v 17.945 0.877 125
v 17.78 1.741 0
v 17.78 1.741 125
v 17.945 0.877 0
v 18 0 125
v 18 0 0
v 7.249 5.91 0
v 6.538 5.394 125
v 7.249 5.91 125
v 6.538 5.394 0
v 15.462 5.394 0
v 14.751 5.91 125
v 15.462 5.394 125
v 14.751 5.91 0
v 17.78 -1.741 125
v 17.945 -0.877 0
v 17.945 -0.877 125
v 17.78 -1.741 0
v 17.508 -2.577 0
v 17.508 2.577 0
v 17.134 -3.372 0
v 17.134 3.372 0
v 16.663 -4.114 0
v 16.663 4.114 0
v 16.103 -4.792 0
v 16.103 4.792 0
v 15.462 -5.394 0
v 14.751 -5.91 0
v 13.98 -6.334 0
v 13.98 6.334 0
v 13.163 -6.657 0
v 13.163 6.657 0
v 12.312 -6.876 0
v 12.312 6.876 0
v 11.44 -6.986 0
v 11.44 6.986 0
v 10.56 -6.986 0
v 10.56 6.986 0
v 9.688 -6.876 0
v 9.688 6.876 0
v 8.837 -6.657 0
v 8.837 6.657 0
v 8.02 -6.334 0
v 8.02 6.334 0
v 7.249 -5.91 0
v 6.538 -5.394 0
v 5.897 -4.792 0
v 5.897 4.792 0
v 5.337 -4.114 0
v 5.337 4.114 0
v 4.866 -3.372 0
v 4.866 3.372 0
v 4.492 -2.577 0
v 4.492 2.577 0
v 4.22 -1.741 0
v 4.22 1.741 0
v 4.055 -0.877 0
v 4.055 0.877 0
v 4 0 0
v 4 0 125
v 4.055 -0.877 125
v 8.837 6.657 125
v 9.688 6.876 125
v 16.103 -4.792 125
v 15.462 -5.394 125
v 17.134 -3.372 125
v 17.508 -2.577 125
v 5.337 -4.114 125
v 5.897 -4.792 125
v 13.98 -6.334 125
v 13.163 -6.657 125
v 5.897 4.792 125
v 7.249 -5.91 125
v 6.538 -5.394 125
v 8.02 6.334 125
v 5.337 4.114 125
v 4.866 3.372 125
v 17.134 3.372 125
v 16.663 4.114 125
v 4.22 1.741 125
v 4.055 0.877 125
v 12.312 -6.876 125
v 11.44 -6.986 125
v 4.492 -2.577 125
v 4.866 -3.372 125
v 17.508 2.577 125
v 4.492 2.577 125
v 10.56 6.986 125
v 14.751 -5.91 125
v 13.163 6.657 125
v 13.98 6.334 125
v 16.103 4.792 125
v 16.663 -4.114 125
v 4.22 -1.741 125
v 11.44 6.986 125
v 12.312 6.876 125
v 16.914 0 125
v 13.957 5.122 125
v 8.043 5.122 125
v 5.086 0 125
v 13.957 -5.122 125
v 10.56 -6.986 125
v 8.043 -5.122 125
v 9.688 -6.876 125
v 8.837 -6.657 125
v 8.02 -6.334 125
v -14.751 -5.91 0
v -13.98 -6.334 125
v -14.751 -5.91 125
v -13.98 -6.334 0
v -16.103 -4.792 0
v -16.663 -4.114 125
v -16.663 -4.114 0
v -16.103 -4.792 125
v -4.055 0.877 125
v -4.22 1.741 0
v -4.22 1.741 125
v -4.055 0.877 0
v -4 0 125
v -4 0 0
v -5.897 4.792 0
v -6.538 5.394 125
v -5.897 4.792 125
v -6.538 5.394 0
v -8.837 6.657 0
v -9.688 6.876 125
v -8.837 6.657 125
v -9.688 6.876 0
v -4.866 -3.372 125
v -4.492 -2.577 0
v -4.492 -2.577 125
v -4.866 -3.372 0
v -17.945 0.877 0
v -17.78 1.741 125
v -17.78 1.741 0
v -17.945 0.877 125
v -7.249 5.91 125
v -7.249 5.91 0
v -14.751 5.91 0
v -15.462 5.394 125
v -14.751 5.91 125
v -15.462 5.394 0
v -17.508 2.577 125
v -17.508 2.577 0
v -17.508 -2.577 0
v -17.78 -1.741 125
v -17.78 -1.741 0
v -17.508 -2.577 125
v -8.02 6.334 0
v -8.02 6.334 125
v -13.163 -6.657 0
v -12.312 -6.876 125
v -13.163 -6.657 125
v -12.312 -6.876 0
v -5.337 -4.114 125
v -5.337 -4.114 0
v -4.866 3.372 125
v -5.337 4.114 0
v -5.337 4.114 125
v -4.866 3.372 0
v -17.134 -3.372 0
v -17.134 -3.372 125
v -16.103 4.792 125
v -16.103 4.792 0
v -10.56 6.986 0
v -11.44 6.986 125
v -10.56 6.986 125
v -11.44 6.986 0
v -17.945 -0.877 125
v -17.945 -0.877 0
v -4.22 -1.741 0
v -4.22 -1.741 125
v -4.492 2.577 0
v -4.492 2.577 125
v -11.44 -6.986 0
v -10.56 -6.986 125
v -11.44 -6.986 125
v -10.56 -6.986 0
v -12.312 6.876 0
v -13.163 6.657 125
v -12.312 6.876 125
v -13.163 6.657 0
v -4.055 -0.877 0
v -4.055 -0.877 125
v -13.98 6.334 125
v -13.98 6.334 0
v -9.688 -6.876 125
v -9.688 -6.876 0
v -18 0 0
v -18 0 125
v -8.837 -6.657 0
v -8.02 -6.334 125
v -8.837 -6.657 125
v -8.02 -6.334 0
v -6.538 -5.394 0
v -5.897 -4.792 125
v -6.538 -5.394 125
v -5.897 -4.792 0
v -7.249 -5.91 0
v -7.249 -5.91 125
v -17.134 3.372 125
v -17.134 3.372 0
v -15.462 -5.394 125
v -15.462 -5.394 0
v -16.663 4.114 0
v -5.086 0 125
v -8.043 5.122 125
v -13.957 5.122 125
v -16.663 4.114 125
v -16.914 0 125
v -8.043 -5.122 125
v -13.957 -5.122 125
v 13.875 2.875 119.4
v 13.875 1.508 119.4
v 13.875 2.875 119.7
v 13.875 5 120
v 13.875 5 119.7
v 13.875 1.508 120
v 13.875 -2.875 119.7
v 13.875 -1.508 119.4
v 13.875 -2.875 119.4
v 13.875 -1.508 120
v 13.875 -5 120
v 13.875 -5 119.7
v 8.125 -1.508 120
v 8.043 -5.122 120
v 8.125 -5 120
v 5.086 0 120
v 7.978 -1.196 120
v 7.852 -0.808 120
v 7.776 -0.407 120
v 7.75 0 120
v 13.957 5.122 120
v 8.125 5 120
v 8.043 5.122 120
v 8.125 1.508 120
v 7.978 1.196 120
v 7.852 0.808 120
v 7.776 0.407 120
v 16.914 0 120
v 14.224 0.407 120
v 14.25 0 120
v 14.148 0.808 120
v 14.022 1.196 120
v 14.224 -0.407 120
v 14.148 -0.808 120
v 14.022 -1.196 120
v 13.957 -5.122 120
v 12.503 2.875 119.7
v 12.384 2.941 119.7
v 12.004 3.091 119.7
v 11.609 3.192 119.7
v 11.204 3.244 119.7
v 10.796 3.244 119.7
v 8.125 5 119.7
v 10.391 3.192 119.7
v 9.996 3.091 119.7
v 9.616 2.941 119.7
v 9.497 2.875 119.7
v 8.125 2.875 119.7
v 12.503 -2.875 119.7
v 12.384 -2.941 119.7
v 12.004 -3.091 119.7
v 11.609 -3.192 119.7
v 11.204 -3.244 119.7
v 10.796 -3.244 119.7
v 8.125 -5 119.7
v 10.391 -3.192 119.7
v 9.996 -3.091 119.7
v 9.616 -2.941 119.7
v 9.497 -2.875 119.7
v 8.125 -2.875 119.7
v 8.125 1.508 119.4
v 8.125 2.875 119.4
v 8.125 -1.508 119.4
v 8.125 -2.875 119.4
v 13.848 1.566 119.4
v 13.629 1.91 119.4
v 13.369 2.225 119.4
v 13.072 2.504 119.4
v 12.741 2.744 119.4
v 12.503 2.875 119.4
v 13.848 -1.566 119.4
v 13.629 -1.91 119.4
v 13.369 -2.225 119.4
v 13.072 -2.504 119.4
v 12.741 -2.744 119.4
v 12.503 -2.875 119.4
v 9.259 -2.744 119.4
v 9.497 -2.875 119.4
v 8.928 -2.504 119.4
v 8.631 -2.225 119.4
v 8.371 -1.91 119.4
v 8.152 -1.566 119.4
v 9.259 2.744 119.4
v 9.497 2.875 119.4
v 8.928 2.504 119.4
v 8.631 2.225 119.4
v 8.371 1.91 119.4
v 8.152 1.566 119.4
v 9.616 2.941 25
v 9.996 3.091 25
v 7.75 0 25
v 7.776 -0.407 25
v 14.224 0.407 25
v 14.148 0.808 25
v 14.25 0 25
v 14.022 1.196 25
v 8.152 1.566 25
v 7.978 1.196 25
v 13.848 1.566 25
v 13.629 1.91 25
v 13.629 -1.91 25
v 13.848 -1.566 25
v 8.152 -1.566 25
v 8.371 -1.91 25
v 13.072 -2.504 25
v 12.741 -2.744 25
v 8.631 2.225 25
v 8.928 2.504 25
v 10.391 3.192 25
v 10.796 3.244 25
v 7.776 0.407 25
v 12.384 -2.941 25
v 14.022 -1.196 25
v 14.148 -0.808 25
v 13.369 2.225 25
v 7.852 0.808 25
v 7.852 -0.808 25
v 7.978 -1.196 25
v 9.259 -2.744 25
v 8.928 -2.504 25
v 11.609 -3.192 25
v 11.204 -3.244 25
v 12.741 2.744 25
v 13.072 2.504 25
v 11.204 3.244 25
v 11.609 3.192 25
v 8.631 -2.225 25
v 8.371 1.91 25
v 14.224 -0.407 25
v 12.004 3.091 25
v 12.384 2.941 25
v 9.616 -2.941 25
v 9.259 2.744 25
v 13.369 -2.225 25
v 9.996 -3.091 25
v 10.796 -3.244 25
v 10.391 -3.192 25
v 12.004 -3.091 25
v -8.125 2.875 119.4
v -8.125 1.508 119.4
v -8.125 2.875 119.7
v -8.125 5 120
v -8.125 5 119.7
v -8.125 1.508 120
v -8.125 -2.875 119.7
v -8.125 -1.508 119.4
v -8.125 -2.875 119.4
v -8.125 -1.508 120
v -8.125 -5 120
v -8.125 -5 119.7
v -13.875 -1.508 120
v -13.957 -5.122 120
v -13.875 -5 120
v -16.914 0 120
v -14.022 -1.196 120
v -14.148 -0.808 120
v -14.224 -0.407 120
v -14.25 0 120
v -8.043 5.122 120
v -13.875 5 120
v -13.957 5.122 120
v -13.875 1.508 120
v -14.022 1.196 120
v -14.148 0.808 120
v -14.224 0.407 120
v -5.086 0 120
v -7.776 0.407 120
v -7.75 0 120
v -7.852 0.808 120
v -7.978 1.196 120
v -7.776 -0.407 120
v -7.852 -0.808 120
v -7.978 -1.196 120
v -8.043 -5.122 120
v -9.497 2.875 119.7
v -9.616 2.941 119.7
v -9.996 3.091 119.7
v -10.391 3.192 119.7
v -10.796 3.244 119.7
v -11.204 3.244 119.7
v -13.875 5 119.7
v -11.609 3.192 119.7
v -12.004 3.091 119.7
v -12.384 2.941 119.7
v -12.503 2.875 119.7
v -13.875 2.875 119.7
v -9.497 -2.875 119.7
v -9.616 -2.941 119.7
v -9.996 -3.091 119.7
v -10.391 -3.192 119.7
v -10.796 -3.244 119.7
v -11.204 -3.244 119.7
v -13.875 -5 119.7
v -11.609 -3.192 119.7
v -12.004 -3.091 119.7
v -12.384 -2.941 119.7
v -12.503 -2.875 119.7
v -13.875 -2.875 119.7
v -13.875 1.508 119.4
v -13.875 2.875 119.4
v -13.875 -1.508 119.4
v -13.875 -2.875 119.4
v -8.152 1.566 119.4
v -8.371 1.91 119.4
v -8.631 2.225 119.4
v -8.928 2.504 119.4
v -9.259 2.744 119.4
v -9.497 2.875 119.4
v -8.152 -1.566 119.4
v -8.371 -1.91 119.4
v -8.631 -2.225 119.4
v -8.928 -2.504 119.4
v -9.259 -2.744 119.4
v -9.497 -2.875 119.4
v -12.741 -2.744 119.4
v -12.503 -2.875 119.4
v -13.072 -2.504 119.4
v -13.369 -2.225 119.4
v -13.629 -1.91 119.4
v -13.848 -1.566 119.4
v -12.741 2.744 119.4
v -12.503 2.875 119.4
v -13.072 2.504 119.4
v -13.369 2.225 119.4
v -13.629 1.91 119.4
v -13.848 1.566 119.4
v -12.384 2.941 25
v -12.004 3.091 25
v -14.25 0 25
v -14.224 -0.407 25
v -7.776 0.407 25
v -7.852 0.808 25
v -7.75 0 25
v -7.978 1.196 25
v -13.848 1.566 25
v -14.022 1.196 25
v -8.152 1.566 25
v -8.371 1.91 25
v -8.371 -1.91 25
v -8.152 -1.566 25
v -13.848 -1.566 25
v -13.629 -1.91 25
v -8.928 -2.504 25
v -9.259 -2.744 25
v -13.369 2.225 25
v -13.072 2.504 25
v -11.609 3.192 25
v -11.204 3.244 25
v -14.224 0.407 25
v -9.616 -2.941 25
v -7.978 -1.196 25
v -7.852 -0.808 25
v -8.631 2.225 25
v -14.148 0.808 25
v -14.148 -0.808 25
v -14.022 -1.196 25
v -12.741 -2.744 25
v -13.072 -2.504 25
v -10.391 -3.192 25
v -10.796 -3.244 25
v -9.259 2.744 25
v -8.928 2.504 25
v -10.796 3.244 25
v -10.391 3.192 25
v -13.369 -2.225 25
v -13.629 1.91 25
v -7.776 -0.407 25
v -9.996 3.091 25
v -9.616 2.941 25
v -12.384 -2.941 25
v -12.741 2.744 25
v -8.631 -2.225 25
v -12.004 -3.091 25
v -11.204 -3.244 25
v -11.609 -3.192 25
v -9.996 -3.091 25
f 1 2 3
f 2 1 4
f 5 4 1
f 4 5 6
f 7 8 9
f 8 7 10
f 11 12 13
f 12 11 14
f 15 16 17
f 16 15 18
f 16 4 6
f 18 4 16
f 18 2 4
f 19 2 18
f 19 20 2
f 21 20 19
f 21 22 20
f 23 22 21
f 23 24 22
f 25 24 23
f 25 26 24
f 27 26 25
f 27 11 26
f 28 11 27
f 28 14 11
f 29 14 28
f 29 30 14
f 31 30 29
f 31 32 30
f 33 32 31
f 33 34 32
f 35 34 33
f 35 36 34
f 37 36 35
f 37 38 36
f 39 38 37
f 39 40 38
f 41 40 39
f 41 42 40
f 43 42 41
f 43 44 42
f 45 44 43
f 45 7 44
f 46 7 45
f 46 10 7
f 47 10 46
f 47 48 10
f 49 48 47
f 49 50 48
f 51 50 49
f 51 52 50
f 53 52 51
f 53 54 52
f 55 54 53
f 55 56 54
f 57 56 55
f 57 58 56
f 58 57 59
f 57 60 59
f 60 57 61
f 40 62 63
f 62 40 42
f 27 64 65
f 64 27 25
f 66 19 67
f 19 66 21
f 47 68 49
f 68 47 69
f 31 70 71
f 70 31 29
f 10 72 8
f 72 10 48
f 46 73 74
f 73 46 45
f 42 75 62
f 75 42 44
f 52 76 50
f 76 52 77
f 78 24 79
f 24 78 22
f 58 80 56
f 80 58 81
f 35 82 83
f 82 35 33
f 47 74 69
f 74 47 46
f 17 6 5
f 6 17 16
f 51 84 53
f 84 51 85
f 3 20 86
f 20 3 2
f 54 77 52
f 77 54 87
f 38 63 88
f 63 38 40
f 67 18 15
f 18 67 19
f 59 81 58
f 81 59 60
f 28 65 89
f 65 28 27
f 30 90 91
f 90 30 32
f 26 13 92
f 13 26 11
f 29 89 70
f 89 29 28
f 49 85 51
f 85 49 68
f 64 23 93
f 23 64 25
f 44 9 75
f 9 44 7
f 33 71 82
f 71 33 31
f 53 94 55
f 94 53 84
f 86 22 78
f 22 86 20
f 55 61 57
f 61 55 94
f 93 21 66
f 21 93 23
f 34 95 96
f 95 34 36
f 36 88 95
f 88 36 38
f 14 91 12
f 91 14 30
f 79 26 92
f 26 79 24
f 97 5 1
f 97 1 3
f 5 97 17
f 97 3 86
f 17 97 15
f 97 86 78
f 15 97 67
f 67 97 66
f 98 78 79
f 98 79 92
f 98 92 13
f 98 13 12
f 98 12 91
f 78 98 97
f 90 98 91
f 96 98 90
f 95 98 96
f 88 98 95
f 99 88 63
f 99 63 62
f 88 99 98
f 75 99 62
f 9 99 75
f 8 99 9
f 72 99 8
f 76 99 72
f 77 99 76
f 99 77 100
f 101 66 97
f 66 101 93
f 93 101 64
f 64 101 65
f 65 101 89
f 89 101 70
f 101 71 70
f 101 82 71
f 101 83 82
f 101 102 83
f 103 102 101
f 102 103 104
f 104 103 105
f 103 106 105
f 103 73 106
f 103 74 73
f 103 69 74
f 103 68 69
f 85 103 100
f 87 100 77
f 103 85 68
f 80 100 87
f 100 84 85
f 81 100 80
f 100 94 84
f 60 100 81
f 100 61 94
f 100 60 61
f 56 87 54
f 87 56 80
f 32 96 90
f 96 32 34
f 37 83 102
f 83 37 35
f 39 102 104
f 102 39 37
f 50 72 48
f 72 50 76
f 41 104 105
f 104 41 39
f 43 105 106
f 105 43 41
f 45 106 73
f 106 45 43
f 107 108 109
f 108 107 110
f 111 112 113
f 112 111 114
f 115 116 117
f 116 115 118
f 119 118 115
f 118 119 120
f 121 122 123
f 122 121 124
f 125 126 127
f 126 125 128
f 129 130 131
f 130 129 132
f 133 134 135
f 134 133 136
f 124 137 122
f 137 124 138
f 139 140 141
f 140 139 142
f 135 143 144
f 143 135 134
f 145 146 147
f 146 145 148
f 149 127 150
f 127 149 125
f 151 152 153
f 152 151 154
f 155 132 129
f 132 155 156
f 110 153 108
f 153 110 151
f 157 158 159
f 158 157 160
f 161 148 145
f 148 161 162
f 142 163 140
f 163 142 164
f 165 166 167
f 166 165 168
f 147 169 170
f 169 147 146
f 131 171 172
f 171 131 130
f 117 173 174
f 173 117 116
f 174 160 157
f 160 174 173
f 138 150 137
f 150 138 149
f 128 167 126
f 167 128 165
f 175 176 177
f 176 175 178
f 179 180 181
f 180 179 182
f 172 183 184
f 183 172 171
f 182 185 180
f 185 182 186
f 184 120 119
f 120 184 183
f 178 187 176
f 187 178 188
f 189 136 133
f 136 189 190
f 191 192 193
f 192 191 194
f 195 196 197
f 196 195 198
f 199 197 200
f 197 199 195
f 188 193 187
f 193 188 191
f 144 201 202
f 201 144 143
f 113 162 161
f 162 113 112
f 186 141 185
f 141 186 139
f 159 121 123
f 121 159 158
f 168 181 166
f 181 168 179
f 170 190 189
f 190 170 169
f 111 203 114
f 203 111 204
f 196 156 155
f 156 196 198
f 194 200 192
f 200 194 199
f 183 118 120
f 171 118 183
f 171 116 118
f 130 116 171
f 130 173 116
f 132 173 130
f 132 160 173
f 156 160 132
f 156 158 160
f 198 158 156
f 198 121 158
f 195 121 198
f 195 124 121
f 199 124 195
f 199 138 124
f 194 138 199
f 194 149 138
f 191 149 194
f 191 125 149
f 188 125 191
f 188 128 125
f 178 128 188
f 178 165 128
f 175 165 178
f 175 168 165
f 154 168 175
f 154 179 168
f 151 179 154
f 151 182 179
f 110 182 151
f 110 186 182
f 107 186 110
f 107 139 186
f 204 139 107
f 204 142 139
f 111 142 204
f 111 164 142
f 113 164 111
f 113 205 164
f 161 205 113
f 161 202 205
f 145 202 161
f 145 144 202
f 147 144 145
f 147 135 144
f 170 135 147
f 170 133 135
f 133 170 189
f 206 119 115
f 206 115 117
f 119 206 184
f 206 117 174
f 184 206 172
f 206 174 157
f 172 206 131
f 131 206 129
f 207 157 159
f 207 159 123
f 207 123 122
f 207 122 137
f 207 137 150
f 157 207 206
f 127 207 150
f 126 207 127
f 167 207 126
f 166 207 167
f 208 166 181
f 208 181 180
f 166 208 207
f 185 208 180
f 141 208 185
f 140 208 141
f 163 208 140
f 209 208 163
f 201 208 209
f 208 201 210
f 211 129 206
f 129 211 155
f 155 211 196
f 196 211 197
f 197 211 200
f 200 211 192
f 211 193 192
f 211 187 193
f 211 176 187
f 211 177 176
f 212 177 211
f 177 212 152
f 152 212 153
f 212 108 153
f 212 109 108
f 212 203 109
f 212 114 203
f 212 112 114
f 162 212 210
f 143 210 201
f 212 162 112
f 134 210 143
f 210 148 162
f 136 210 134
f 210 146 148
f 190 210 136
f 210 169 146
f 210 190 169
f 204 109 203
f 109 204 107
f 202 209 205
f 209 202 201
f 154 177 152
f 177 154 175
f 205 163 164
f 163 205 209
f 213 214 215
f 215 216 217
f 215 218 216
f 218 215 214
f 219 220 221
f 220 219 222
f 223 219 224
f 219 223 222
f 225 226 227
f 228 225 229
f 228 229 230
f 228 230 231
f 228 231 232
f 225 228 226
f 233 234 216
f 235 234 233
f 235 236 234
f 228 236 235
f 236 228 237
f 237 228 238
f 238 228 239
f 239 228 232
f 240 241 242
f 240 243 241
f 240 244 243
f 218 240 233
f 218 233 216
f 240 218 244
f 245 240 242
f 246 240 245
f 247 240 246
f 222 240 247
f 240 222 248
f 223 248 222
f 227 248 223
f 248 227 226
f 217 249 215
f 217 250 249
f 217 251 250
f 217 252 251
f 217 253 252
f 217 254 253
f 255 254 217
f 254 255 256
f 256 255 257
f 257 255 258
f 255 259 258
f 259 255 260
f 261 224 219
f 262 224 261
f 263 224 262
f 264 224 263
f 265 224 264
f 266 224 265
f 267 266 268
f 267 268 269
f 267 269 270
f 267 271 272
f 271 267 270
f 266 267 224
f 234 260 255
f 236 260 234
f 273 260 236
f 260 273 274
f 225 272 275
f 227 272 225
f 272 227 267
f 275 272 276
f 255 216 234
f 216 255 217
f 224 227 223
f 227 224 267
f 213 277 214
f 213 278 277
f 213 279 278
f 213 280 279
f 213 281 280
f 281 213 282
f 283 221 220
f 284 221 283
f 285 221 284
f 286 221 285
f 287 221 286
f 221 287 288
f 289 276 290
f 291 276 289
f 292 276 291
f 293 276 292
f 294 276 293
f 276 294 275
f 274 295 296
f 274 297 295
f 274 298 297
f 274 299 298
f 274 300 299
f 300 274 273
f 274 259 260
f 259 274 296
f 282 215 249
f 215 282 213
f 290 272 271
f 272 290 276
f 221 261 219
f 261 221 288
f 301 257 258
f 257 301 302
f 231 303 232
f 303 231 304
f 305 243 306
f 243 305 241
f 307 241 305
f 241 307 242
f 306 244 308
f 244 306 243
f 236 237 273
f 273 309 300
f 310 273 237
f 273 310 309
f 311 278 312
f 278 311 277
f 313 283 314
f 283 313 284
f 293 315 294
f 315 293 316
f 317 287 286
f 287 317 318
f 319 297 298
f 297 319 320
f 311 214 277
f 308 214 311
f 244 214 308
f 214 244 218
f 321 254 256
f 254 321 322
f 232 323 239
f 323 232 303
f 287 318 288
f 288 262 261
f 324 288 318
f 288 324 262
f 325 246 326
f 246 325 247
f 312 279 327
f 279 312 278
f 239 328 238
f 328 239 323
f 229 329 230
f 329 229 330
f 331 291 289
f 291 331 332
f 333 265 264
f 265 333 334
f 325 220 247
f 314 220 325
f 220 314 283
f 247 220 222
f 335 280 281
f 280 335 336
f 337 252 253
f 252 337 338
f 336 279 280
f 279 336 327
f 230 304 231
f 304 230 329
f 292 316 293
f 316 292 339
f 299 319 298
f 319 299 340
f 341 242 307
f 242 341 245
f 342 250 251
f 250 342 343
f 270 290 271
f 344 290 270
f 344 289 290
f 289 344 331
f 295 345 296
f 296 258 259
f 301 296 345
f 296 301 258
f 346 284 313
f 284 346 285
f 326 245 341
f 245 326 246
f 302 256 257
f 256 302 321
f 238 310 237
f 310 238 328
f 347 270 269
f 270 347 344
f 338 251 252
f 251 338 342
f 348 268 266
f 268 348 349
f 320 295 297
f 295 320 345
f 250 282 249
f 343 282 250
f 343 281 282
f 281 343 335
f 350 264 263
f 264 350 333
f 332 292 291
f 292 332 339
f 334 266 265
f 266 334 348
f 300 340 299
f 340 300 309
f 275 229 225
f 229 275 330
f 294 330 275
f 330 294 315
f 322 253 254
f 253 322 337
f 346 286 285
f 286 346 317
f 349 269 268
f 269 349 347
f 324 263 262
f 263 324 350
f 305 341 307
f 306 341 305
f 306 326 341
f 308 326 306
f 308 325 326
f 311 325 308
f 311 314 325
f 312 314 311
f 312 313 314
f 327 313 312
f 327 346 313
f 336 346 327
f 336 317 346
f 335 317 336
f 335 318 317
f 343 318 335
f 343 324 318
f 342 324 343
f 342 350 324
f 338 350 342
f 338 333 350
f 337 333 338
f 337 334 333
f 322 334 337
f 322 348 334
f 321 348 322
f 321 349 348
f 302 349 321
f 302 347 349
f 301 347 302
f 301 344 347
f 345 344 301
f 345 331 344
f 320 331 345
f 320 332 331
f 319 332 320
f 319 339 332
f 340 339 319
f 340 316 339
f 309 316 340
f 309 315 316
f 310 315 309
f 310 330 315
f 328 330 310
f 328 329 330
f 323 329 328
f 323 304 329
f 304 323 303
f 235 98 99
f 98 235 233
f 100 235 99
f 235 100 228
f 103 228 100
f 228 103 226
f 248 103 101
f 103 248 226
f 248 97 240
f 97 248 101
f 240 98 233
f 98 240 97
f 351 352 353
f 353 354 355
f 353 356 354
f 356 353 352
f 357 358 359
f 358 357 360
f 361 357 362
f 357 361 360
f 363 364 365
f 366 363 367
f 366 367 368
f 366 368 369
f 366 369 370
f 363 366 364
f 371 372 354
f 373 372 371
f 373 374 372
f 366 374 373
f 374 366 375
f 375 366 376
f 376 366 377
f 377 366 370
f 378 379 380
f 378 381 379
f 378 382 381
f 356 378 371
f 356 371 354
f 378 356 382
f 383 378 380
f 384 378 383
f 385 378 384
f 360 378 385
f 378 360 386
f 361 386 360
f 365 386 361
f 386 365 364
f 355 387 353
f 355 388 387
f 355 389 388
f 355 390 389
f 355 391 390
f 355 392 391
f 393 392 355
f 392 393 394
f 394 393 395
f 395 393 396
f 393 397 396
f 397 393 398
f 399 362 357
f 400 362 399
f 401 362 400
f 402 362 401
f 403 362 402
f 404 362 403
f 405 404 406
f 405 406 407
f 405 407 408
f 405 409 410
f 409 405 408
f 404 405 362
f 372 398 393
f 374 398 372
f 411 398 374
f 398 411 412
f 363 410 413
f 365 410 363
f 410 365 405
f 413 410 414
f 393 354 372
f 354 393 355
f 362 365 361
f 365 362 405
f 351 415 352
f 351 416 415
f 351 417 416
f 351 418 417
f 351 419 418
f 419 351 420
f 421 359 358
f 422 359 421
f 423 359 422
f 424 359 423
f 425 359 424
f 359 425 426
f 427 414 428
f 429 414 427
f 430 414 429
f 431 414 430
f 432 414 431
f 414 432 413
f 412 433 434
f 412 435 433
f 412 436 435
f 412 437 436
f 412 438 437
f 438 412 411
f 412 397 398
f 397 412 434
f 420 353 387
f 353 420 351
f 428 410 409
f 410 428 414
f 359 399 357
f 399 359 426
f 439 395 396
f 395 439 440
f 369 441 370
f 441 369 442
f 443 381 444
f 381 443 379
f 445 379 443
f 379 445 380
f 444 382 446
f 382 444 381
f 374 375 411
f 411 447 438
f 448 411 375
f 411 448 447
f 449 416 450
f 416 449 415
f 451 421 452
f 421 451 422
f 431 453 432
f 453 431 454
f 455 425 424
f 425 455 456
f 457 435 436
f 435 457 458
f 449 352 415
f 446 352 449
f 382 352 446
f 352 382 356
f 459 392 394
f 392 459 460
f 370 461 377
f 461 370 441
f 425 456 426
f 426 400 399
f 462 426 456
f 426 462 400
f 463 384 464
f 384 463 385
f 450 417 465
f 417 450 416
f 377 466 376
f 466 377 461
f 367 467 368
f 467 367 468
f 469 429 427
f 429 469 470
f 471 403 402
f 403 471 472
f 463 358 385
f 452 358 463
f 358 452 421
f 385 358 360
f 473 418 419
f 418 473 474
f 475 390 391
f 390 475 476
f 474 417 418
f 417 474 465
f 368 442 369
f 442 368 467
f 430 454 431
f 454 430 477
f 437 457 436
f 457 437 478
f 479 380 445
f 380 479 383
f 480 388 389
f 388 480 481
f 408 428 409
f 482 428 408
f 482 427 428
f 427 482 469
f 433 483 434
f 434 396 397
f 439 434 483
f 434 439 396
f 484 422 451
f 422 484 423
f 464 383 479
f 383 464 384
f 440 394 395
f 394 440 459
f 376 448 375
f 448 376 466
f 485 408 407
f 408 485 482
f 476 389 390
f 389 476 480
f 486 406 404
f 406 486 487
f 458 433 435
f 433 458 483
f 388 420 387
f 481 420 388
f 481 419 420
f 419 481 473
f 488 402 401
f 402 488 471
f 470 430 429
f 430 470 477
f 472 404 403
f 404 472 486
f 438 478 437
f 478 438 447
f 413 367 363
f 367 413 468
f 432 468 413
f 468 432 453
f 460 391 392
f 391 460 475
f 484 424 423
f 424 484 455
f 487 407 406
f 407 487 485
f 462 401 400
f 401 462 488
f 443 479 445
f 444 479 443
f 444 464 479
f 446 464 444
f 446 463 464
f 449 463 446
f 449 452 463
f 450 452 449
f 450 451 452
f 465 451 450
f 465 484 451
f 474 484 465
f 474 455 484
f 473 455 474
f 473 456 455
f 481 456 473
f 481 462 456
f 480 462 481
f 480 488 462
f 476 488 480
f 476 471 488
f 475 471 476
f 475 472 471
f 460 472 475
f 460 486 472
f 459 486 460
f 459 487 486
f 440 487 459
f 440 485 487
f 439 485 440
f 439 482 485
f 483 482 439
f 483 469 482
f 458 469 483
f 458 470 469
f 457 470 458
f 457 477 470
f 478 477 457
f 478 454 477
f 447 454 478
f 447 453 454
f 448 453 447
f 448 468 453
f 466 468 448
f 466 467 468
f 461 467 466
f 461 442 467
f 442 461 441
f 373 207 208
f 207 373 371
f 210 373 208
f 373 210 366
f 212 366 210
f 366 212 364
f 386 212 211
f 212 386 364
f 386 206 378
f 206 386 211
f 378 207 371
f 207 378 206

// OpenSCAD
$fn = 50;


difference() {
	union() {
		translate(v = [11.0000000000, 0, 0.0000000000]) {
			cylinder(h = 125, r = 7.0000000000);
		}
		translate(v = [-11.0000000000, 0, 0.0000000000]) {
			cylinder(h = 125, r = 7.0000000000);
		}
	}
	union() {
		translate(v = [11.0000000000, 0, 125]) {
			rotate(a = [0, 0, 0]) {
				difference() {
					union() {
						#translate(v = [-2.8750000000, -5.0000000000, -5.3000000000]) {
							cube(size = [5.7500000000, 10, 0.3000000000]);
						}
						#translate(v = [-2.8750000000, -2.8750000000, -5.6000000000]) {
							cube(size = [5.7500000000, 5.7500000000, 0.3000000000]);
						}
						#translate(v = [-2.8750000000, -5.0000000000, 0]) {
							cube(size = [5.7500000000, 10, 0.3000000000]);
						}
						#translate(v = [-2.8750000000, -2.8750000000, 0.3000000000]) {
							cube(size = [5.7500000000, 5.7500000000, 0.3000000000]);
						}
						#translate(v = [0, 0, -100.0000000000]) {
							cylinder(h = 200, r = 3.2500000000);
						}
						translate(v = [0, 0, -5]) {
							#linear_extrude(height = 5) {
								polygon(points = [[5.9142500000, 0.0000000000], [2.9571250000, 5.1218907443], [-2.9571250000, 5.1218907443], [-5.9142500000, 0.0000000000], [-2.9571250000, -5.1218907443], [2.9571250000, -5.1218907443]]);
							}
						}
						#translate(v = [-2.8750000000, -5.0000000000, -5.3000000000]) {
							cube(size = [5.7500000000, 10, 0.3000000000]);
						}
						#translate(v = [-2.8750000000, -2.8750000000, -5.6000000000]) {
							cube(size = [5.7500000000, 5.7500000000, 0.3000000000]);
						}
						#translate(v = [-2.8750000000, -5.0000000000, 0]) {
							cube(size = [5.7500000000, 10, 0.3000000000]);
						}
						#translate(v = [-2.8750000000, -2.8750000000, 0.3000000000]) {
							cube(size = [5.7500000000, 5.7500000000, 0.3000000000]);
						}
						#translate(v = [0, 0, -100.0000000000]) {
							cylinder(h = 200, r = 3.2500000000);
						}
						#translate(v = [-2.8750000000, -5.0000000000, -5.3000000000]) {
							cube(size = [5.7500000000, 10, 0.3000000000]);
						}
						#translate(v = [-2.8750000000, -2.8750000000, -5.6000000000]) {
							cube(size = [5.7500000000, 5.7500000000, 0.3000000000]);
						}
						#translate(v = [-2.8750000000, -5.0000000000, 0]) {
							cube(size = [5.7500000000, 10, 0.3000000000]);
						}
						#translate(v = [-2.8750000000, -2.8750000000, 0.3000000000]) {
							cube(size = [5.7500000000, 5.7500000000, 0.3000000000]);
						}
						#translate(v = [0, 0, -100.0000000000]) {
							cylinder(h = 200, r = 3.2500000000);
						}
					}
					union();
				}
			}
		}
		translate(v = [-11.0000000000, 0, 125]) {
			rotate(a = [0, 0, 0]) {
				difference() {
					union() {
						#translate(v = [-2.8750000000, -5.0000000000, -5.3000000000]) {
							cube(size = [5.7500000000, 10, 0.3000000000]);
						}
						#translate(v = [-2.8750000000, -2.8750000000, -5.6000000000]) {
							cube(size = [5.7500000000, 5.7500000000, 0.3000000000]);
						}
						#translate(v = [-2.8750000000, -5.0000000000, 0]) {
							cube(size = [5.7500000000, 10, 0.3000000000]);
						}
						#translate(v = [-2.8750000000, -2.8750000000, 0.3000000000]) {
							cube(size = [5.7500000000, 5.7500000000, 0.3000000000]);
						}
						#translate(v = [0, 0, -100.0000000000]) {
							cylinder(h = 200, r = 3.2500000000);
						}
						translate(v = [0, 0, -5]) {
							#linear_extrude(height = 5) {
								polygon(points = [[5.9142500000, 0.0000000000], [2.9571250000, 5.1218907443], [-2.9571250000, 5.1218907443], [-5.9142500000, 0.0000000000], [-2.9571250000, -5.1218907443], [2.9571250000, -5.1218907443]]);
							}
						}
						#translate(v = [-2.8750000000, -5.0000000000, -5.3000000000]) {
							cube(size = [5.7500000000, 10, 0.3000000000]);
						}
						#translate(v = [-2.8750000000, -2.8750000000, -5.6000000000]) {
							cube(size = [5.7500000000, 5.7500000000, 0.3000000000]);
						}
						#translate(v = [-2.8750000000, -5.0000000000, 0]) {
							cube(size = [5.7500000000, 10, 0.3000000000]);
						}
						#translate(v = [-2.8750000000, -2.8750000000, 0.3000000000]) {
							cube(size = [5.7500000000, 5.7500000000, 0.3000000000]);
						}
						#translate(v = [0, 0, -100.0000000000]) {
							cylinder(h = 200, r = 3.2500000000);
						}
						#translate(v = [-2.8750000000, -5.0000000000, -5.3000000000]) {
							cube(size = [5.7500000000, 10, 0.3000000000]);
						}
						#translate(v = [-2.8750000000, -2.8750000000, -5.6000000000]) {
							cube(size = [5.7500000000, 5.7500000000, 0.3000000000]);
						}
						#translate(v = [-2.8750000000, -5.0000000000, 0]) {
							cube(size = [5.7500000000, 10, 0.3000000000]);
						}
						#translate(v = [-2.8750000000, -2.8750000000, 0.3000000000]) {
							cube(size = [5.7500000000, 5.7500000000, 0.3000000000]);
						}
						#translate(v = [0, 0, -100.0000000000]) {
							cylinder(h = 200, r = 3.2500000000);
						}
					}
					union();
				}
			}
		}
	}
}
